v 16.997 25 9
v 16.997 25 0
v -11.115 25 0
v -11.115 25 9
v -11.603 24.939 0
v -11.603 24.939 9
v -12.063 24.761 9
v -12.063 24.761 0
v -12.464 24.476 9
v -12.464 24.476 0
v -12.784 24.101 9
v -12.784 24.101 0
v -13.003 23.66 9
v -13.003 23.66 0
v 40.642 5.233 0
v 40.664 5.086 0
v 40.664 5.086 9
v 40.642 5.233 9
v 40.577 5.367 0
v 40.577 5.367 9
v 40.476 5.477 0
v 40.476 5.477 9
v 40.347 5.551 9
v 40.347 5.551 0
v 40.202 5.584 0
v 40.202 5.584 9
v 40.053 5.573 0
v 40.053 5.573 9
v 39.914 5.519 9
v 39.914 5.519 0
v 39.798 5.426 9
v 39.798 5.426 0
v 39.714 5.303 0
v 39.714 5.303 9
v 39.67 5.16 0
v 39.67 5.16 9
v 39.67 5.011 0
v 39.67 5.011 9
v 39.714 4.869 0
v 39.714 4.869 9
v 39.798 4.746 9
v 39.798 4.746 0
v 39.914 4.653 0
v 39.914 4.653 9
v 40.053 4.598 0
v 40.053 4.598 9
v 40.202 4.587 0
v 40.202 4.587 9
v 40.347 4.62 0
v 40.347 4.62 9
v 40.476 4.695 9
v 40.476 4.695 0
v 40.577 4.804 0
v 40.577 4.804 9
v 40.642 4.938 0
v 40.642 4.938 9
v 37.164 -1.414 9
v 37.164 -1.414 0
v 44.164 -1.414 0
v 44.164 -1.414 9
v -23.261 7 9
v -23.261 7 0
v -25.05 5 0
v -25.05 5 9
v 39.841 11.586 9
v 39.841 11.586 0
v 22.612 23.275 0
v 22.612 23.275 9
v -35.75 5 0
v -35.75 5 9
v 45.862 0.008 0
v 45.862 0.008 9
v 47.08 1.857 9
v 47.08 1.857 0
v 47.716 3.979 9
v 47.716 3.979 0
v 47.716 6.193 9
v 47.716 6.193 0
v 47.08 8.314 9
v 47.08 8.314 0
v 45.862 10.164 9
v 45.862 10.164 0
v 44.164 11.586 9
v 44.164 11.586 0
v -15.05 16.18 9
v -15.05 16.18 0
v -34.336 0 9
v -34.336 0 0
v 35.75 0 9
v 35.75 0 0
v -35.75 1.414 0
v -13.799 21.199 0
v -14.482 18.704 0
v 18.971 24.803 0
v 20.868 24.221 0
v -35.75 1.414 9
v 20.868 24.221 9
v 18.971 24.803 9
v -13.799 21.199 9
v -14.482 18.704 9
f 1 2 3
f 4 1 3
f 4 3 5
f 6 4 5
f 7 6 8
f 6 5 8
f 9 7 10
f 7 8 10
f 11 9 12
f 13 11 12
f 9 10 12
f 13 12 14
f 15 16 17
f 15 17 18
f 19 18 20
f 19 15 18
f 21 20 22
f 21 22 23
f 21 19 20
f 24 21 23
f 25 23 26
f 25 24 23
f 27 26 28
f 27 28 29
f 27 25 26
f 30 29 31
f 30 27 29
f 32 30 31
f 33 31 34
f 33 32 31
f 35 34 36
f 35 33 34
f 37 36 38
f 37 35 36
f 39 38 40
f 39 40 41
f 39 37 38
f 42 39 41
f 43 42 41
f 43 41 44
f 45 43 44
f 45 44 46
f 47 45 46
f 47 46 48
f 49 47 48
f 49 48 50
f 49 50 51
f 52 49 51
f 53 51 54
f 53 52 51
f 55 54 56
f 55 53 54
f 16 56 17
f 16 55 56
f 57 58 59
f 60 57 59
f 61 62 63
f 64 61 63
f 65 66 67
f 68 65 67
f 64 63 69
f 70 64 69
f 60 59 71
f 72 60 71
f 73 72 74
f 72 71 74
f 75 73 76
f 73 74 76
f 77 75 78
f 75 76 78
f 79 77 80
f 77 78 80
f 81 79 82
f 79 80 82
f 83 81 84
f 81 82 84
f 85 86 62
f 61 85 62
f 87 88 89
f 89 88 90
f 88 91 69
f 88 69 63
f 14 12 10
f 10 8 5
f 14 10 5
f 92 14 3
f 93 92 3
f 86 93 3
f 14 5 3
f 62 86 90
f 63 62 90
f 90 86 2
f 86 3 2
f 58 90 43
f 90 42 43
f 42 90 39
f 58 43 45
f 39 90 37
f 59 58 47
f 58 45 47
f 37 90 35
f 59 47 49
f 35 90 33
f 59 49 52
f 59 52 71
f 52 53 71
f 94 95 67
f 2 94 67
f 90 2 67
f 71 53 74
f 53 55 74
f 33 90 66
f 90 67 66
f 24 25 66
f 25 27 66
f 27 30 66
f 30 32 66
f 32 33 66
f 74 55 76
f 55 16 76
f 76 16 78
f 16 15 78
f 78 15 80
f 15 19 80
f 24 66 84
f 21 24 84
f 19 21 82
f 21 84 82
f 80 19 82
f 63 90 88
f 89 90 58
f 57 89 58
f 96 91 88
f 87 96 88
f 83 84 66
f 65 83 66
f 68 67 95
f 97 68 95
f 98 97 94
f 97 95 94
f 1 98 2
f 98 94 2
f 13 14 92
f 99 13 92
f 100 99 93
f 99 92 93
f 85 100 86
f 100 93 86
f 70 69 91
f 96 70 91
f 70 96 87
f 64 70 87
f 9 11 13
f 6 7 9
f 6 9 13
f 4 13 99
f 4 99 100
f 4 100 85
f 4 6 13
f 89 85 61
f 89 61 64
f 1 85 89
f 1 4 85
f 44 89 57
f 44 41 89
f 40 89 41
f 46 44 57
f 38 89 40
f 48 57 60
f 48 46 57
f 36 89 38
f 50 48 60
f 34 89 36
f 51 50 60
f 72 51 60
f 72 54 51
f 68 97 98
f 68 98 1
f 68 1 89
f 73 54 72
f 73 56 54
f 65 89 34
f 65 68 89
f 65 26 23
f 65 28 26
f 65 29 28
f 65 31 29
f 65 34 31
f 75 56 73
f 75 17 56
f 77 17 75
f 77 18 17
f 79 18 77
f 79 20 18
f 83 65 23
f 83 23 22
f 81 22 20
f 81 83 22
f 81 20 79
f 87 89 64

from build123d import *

# Parameters (mm, degrees)
F0_R     = 1.925
F0_W     = 1.25
F0_H     = 2.5
F0_R_2   = 0.5
F1_DEPTH = 9


with BuildPart() as f1:
    # F0 (on Top) → F1 (new body)
    with BuildSketch(Plane.XY):
        Polygon((-35.75, 1.414214), (-34.335786, 0), (-29.522136, 0), (-25.05, 5), (-35.75, 5), align=None)
        with BuildLine():
            Line((-25.05, 5), (-29.522136, 0))
            Line((-29.522136, 0), (-0.75, 0))
            Line((-0.75, 0), (-0.75, 4))
            ThreePointArc((-0.75, 4), (-1.62868, 6.12132), (-3.75, 7))
            Line((-3.75, 7), (-23.261146, 7))
            Line((-23.261146, 7), (-25.05, 5))
        make_face()
        with BuildLine():
            Line((-0.75, 4), (-0.75, 0))
            Line((-0.75, 0), (35.75, 0))
            Line((35.75, 0), (37.164214, -1.414214))
            Line((37.164214, -1.414214), (44.164214, -1.414214))
            ThreePointArc((44.164214, -1.414214), (47.796382, 5.085786), (44.164214, 11.585786))
            Line((44.164214, 11.585786), (39.841021, 11.585786))
            Line((39.841021, 11.585786), (22.611781, 23.275177))
            ThreePointArc((22.611781, 23.275177), (19.934069, 24.559073), (16.997385, 25))
            Line((16.997385, 25), (2.247385, 25))
            Line((2.247385, 25), (2.247385, 22.5))
            Line((2.247385, 22.5), (0.997385, 22.5))
            Line((0.997385, 22.5), (0.997385, 25))
            Line((0.997385, 25), (-11.114516, 25))
            ThreePointArc((-11.114516, 25), (-12.272269, 24.63083), (-13.002615, 23.659607))
            ThreePointArc((-13.002615, 23.659607), (-14.155189, 19.955254), (-15.05, 16.18034))
            Line((-15.05, 16.18034), (-23.261146, 7))
            Line((-23.261146, 7), (-3.75, 7))
            ThreePointArc((-3.75, 7), (-1.62868, 6.12132), (-0.75, 4))
        make_face()
        with Locations((40.164214, 5.085786)):
            Circle(F0_R, mode=Mode.SUBTRACT)
        with Locations((1.622385, 23.75)):
            Rectangle(F0_W, F0_H)
        with Locations((40.164214, 5.085786)):
            Circle(F0_R)
        with Locations((40.164214, 5.085786)):
            Circle(F0_R_2, mode=Mode.SUBTRACT)
    extrude(amount=F1_DEPTH)


solid = f1.part
